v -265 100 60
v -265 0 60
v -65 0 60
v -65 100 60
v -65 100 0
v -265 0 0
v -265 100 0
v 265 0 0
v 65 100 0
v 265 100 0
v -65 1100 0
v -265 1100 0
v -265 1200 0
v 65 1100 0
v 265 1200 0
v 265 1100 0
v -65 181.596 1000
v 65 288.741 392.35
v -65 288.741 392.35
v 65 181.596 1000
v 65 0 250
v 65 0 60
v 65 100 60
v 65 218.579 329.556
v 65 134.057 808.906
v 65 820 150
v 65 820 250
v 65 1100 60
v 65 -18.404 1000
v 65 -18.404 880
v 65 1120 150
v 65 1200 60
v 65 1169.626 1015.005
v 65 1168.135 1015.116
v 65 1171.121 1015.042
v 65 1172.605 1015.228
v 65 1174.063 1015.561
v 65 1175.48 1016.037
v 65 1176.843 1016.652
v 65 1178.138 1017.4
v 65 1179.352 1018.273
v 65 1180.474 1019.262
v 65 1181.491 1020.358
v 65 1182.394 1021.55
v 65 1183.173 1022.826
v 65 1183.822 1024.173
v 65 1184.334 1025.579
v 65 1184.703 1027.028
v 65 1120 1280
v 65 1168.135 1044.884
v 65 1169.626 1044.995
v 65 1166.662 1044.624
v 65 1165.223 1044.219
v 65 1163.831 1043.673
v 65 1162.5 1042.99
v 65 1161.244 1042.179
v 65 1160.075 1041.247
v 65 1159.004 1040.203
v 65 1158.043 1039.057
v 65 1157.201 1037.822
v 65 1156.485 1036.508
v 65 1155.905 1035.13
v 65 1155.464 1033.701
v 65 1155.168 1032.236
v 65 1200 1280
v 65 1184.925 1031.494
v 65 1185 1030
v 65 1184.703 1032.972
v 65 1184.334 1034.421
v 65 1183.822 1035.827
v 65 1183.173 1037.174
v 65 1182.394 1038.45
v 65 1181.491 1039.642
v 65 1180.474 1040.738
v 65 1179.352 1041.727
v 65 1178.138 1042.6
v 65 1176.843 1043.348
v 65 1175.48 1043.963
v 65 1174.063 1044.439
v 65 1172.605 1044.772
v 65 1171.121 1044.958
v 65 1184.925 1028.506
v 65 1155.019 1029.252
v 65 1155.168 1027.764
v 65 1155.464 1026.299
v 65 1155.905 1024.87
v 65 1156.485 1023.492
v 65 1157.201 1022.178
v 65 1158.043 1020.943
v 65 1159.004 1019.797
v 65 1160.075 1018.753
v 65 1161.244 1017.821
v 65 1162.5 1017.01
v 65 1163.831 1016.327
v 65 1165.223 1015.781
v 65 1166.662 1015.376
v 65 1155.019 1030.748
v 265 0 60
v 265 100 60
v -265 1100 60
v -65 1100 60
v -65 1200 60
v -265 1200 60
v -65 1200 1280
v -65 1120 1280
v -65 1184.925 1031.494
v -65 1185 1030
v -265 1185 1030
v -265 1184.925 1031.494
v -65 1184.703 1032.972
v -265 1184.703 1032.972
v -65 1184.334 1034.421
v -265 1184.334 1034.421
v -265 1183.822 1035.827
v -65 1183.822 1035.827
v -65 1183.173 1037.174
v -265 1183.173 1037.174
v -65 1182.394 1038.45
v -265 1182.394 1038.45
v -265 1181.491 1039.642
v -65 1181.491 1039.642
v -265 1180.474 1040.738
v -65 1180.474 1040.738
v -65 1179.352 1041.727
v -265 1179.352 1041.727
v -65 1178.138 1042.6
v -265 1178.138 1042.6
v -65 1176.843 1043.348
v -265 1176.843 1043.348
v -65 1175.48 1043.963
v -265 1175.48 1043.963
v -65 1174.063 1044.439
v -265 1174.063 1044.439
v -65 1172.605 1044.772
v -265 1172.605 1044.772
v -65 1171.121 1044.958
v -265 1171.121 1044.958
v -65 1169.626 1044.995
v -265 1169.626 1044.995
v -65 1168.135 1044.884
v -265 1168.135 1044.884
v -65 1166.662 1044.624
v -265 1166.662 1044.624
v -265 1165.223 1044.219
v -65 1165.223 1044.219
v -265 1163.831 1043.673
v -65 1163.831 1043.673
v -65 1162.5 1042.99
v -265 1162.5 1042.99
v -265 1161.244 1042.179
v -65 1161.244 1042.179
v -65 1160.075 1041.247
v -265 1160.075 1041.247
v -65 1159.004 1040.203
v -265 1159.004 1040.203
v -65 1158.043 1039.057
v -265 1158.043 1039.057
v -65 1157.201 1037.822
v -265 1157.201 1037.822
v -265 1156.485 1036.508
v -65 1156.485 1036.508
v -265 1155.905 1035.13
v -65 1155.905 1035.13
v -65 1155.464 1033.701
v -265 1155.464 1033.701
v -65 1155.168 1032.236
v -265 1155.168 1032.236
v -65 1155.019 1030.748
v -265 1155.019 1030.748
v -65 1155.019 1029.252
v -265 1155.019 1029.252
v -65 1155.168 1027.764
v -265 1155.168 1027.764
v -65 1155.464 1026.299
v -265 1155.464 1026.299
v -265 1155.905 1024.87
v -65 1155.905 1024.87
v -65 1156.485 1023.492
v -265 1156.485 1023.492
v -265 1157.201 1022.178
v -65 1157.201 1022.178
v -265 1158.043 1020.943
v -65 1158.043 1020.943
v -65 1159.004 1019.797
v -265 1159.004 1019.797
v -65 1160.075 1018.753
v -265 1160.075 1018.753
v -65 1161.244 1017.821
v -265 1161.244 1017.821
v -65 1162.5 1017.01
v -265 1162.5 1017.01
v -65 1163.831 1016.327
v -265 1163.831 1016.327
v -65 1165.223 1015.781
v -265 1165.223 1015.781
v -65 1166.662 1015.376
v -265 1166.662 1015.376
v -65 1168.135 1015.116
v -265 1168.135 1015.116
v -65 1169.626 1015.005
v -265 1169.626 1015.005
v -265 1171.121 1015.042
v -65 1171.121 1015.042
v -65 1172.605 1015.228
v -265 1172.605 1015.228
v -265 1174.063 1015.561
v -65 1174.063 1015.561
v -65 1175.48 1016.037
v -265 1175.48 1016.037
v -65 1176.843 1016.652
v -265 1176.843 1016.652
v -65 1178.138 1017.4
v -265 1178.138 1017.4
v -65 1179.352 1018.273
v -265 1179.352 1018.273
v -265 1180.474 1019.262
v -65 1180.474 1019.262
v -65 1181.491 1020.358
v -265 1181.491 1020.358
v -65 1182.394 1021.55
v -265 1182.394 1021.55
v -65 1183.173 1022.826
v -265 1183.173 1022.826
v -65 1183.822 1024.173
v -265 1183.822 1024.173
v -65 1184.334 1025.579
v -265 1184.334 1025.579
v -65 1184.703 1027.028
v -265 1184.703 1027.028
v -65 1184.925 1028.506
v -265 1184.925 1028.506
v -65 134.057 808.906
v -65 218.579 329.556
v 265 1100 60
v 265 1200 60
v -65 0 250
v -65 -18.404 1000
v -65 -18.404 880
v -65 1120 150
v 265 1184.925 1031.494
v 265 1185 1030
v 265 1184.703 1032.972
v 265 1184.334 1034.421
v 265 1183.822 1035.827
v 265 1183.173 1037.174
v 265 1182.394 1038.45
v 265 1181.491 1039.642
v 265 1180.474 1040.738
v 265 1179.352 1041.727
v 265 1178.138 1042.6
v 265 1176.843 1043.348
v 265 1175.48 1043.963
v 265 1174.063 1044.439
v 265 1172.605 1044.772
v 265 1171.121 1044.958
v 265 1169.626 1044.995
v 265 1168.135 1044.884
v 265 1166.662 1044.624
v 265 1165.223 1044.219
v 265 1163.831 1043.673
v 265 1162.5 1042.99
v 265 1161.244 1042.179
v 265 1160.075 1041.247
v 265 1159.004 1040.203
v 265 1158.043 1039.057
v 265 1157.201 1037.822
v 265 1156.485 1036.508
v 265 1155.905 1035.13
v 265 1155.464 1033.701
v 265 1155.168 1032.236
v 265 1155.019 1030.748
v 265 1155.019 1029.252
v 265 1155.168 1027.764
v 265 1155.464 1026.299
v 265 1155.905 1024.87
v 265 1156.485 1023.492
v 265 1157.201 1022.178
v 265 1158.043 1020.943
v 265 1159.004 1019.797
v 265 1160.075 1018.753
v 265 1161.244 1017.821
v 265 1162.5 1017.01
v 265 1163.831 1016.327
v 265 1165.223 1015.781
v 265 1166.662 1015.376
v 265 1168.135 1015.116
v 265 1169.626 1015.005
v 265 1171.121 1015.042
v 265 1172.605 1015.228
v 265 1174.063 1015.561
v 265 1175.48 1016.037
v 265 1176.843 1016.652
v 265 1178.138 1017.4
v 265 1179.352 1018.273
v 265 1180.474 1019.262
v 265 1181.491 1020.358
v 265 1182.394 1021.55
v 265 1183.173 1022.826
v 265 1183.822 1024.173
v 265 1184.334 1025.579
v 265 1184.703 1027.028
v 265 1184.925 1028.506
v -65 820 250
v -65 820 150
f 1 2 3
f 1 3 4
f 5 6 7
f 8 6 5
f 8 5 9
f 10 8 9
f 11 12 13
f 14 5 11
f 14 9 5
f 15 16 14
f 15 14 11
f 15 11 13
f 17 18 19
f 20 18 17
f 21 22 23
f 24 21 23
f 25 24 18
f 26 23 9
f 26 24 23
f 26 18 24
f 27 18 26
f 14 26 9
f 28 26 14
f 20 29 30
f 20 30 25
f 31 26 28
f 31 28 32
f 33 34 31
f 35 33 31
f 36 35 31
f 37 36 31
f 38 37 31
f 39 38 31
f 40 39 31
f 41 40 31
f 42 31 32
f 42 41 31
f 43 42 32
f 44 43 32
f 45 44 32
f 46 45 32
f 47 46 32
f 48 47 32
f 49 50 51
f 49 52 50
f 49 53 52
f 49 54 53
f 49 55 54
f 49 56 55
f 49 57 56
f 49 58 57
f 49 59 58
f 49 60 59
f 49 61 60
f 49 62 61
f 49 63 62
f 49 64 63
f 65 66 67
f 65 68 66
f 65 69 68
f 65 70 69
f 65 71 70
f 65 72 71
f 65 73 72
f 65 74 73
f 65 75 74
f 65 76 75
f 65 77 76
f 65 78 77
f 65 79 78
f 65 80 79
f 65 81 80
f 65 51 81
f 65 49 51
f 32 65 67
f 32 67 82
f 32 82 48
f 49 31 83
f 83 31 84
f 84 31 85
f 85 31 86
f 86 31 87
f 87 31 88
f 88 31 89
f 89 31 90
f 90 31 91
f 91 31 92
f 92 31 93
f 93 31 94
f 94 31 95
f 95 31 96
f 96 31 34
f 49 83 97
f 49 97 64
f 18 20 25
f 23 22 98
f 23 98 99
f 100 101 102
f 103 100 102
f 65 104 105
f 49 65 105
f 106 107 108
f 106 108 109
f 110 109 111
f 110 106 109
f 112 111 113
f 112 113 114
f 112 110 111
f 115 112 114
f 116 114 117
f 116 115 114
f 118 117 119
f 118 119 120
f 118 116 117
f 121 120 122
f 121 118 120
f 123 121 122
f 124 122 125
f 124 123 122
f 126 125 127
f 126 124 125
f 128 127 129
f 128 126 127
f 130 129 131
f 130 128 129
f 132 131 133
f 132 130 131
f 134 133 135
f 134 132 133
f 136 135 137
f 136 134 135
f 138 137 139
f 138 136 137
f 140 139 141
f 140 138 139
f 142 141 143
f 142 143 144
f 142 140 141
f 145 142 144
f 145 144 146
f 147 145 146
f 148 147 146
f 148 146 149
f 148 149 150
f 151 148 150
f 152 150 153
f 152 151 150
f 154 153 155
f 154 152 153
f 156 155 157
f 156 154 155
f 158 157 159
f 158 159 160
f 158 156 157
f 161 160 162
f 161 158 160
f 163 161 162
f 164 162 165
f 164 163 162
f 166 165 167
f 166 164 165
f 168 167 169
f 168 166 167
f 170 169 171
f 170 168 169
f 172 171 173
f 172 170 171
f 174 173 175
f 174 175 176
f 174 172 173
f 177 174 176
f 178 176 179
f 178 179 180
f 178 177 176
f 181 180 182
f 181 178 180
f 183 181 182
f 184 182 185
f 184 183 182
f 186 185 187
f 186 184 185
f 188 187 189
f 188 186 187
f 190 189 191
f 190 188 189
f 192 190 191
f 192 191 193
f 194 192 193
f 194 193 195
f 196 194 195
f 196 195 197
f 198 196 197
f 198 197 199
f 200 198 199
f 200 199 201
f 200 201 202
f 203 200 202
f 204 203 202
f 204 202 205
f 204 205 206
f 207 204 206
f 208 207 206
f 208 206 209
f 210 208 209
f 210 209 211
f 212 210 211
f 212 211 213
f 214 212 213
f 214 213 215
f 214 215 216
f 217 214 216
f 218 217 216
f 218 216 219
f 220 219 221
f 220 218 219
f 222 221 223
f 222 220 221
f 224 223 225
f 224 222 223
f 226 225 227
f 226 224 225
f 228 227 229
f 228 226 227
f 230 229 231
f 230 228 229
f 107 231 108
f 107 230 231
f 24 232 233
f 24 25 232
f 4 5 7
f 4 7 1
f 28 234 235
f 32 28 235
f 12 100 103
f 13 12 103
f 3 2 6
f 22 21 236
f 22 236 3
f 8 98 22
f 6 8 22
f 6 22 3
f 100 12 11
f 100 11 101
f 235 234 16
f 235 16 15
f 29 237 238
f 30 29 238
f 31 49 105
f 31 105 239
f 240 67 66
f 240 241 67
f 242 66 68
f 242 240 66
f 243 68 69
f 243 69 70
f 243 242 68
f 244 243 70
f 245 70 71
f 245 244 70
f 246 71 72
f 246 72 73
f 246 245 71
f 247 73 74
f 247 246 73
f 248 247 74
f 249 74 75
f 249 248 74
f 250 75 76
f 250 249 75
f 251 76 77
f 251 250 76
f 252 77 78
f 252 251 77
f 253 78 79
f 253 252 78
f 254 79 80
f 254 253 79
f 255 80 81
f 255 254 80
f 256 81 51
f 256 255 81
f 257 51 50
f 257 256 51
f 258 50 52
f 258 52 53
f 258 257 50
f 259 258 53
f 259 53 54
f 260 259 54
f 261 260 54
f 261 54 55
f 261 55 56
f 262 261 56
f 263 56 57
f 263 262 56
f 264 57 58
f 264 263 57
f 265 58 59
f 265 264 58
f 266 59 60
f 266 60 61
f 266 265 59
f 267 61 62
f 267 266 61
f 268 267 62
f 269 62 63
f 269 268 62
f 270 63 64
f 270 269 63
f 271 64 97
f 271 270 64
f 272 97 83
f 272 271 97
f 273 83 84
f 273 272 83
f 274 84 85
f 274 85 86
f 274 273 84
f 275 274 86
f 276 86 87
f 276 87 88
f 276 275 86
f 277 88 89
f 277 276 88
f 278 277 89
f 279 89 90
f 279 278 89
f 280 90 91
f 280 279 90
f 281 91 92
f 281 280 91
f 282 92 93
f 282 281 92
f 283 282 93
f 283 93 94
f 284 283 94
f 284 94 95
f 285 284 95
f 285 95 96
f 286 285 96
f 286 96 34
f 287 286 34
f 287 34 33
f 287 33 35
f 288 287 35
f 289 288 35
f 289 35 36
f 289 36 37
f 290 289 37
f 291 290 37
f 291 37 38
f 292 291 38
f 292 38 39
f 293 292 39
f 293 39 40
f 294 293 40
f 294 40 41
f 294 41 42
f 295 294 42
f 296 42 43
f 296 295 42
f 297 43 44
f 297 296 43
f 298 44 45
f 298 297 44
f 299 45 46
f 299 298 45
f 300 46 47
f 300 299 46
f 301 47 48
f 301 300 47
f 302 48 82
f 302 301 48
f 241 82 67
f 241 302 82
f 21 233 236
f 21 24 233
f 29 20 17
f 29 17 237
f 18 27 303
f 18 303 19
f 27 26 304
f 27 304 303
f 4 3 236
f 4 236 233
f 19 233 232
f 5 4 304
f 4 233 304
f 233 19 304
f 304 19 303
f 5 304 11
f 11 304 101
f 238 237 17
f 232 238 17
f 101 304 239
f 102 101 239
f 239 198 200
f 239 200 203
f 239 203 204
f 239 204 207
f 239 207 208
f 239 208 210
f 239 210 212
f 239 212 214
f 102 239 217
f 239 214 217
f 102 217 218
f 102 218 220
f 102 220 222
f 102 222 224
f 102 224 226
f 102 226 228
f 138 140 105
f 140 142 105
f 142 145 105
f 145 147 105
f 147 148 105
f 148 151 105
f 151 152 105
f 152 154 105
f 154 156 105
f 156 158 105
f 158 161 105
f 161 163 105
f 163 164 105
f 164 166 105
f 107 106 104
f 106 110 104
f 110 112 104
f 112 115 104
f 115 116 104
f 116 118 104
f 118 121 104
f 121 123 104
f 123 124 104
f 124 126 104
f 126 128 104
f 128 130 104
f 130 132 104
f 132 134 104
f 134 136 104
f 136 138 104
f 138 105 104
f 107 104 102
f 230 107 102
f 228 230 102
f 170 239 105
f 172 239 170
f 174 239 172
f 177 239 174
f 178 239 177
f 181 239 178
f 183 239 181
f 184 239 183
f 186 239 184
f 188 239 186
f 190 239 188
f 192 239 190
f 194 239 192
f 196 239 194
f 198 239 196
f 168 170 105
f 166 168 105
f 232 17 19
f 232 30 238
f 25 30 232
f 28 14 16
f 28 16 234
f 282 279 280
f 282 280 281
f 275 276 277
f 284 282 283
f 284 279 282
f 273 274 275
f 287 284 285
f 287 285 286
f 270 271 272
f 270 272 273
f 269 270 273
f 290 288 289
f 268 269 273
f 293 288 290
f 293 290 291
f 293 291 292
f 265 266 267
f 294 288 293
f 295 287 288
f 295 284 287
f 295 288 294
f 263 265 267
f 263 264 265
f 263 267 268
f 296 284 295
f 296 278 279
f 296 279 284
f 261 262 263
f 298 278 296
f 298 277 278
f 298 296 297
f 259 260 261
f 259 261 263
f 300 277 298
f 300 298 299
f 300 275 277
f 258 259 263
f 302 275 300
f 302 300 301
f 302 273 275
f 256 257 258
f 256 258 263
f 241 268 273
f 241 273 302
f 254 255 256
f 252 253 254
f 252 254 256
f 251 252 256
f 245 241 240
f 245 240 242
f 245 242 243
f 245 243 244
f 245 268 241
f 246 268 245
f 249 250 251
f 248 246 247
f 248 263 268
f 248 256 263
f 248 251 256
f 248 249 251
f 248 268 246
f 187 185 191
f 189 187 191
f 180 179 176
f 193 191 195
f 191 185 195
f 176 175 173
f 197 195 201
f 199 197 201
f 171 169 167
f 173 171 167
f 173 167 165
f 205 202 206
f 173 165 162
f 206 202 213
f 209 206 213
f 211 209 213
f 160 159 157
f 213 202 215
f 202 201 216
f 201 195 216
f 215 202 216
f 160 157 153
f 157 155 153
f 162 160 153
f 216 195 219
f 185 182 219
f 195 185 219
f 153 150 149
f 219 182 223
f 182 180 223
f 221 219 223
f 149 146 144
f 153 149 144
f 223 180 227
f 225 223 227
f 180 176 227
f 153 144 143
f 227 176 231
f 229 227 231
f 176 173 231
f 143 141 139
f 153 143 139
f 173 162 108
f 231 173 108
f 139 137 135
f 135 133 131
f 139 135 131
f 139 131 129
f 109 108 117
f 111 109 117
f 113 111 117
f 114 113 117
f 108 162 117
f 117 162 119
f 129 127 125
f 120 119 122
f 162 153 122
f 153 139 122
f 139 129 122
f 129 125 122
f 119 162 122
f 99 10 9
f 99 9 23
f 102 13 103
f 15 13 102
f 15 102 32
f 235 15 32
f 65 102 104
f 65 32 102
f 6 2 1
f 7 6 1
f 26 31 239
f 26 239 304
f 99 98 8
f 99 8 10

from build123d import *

# Parameters (mm, degrees)
F1_DEPTH = 65
F2_W     = 100
F2_H     = 60
F3_DEPTH = 265
F4_R     = 15
F5_DEPTH = 265


with BuildPart() as f1:
    # F0 (on Right) → F1 (new body, symmetric)
    with BuildSketch(Plane.YZ):
        Polygon((0, 250), (0, 0), (1200, 0), (1200, 1280), (1120, 1280), (1120, 150), (820, 150), (820, 250), (288.740796, 392.350475), (181.595789, 1000), (-18.404211, 1000), (-18.404211, 880), (134.056628, 808.906343), (218.578984, 329.556244), align=None)
    extrude(amount=F1_DEPTH, both=True)

    # F2 (on Right) → F3 (join, symmetric)
    with BuildSketch(Plane.YZ):
        with Locations((50, 30)):
            Rectangle(F2_W, F2_H)
        with Locations((1150, 30)):
            Rectangle(F2_W, F2_H)
    extrude(amount=F3_DEPTH, both=True)

    # F4 (on Right) → F5 (join, symmetric)
    with BuildSketch(Plane.YZ):
        with Locations((1170, 1030)):
            Circle(F4_R)
    extrude(amount=F5_DEPTH, both=True)


solid = f1.part
